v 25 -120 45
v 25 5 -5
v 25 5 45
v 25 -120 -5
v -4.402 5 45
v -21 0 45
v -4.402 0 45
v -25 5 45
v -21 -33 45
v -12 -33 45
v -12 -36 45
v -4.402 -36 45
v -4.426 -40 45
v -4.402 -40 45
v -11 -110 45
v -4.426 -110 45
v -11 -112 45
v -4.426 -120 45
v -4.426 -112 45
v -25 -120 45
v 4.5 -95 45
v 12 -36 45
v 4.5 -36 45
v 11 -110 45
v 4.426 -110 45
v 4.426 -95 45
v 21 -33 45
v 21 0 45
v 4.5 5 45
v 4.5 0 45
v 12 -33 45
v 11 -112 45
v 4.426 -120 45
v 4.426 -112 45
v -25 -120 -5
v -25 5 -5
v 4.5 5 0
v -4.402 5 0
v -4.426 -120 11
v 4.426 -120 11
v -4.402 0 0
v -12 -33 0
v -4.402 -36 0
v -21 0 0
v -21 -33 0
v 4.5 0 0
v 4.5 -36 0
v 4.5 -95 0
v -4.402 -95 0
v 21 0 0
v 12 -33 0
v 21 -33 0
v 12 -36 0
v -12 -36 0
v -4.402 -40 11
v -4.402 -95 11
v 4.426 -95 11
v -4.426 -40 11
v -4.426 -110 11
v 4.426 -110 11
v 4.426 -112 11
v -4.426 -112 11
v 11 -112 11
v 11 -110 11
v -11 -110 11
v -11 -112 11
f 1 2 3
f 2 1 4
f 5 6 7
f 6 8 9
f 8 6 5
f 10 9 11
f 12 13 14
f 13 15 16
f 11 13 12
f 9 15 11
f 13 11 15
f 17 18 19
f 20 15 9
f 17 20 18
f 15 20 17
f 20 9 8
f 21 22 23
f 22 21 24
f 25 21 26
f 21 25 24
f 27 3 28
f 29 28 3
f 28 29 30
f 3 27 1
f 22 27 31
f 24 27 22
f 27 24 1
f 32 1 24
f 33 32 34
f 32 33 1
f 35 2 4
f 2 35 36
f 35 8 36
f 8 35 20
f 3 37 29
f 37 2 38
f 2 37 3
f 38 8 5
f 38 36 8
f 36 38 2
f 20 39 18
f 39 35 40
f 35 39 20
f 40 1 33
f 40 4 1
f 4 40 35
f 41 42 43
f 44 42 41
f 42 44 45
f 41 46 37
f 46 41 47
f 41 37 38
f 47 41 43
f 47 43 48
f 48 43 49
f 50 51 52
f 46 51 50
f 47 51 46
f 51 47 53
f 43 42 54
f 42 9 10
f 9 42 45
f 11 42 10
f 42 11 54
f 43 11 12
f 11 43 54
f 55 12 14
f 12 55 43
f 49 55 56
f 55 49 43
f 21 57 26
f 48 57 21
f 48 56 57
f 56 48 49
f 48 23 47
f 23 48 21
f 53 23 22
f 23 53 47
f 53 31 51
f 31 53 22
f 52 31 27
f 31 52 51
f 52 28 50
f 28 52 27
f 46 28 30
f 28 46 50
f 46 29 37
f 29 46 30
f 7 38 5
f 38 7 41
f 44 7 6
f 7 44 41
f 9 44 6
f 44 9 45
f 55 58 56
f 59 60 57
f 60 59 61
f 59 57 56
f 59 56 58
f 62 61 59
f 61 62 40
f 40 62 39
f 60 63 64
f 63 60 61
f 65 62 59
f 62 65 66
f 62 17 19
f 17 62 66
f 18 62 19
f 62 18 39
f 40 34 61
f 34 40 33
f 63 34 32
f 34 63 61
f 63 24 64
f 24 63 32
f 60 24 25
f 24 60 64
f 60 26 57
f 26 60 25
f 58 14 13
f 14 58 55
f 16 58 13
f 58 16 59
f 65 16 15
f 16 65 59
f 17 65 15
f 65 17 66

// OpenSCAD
motorSize = [40, 40, 31]; 
shaftDim = [5, 100]; 
motorTop = [22, 2,2];

syringeDim = [8, 10, 20]; 
MinStickOut = 13; 
MaxStickOut = 70; 

module motor(motorSize, shaftDim, motorTop){
union(){
cube(motorSize);
translate([motorSize[0] / 2, motorSize[1] / 2, motorSize[2]]) cylinder(h = motorTop[1], d = motorTop[0]); 
translate([motorSize[0] / 2, motorSize[1] / 2, -5]) cylinder(h = shaftDim[1], d = shaftDim[0]); 
    
    }
}

//motor(motorSize, shaftDim, motorTop);





module syringe(syringeDim, MinStickOut, MaxStickOut){
    
    cylinder(h = 30, d = syringeDim[0]); 
    translate([-syringeDim[1]/2, -syringeDim[2]/2, 0]) cube([syringeDim[1], syringeDim[2], 2]); 
    translate([0, 0, -MaxStickOut]) cylinder(h = MaxStickOut, d = 9); 
    
}





//make actuall cutout a little bigger
motorSize = [42, 42, 33]; 
shaftDim = [9, 100]; 
motorTop = [24, 3,3];

syringeDim = [9, 12, 22]; 
MinStickOut = 13; 
MaxStickOut = 70; 

difference(){
translate([-25, -120, -5]) cube([50, 125, 50]); 


linear_extrude([40]) projection(cut = true) rotate([90,0,0])   translate([-motorSize[0] / 2, -motorSize[0] / 2, 0]) motor(motorSize, shaftDim, motorTop);
translate([0,0,11]) linear_extrude([40]) projection(cut = true) translate([0, -110, 0]) rotate([90, 90,0]) syringe(syringeDim, MinStickOut, MaxStickOut);}
